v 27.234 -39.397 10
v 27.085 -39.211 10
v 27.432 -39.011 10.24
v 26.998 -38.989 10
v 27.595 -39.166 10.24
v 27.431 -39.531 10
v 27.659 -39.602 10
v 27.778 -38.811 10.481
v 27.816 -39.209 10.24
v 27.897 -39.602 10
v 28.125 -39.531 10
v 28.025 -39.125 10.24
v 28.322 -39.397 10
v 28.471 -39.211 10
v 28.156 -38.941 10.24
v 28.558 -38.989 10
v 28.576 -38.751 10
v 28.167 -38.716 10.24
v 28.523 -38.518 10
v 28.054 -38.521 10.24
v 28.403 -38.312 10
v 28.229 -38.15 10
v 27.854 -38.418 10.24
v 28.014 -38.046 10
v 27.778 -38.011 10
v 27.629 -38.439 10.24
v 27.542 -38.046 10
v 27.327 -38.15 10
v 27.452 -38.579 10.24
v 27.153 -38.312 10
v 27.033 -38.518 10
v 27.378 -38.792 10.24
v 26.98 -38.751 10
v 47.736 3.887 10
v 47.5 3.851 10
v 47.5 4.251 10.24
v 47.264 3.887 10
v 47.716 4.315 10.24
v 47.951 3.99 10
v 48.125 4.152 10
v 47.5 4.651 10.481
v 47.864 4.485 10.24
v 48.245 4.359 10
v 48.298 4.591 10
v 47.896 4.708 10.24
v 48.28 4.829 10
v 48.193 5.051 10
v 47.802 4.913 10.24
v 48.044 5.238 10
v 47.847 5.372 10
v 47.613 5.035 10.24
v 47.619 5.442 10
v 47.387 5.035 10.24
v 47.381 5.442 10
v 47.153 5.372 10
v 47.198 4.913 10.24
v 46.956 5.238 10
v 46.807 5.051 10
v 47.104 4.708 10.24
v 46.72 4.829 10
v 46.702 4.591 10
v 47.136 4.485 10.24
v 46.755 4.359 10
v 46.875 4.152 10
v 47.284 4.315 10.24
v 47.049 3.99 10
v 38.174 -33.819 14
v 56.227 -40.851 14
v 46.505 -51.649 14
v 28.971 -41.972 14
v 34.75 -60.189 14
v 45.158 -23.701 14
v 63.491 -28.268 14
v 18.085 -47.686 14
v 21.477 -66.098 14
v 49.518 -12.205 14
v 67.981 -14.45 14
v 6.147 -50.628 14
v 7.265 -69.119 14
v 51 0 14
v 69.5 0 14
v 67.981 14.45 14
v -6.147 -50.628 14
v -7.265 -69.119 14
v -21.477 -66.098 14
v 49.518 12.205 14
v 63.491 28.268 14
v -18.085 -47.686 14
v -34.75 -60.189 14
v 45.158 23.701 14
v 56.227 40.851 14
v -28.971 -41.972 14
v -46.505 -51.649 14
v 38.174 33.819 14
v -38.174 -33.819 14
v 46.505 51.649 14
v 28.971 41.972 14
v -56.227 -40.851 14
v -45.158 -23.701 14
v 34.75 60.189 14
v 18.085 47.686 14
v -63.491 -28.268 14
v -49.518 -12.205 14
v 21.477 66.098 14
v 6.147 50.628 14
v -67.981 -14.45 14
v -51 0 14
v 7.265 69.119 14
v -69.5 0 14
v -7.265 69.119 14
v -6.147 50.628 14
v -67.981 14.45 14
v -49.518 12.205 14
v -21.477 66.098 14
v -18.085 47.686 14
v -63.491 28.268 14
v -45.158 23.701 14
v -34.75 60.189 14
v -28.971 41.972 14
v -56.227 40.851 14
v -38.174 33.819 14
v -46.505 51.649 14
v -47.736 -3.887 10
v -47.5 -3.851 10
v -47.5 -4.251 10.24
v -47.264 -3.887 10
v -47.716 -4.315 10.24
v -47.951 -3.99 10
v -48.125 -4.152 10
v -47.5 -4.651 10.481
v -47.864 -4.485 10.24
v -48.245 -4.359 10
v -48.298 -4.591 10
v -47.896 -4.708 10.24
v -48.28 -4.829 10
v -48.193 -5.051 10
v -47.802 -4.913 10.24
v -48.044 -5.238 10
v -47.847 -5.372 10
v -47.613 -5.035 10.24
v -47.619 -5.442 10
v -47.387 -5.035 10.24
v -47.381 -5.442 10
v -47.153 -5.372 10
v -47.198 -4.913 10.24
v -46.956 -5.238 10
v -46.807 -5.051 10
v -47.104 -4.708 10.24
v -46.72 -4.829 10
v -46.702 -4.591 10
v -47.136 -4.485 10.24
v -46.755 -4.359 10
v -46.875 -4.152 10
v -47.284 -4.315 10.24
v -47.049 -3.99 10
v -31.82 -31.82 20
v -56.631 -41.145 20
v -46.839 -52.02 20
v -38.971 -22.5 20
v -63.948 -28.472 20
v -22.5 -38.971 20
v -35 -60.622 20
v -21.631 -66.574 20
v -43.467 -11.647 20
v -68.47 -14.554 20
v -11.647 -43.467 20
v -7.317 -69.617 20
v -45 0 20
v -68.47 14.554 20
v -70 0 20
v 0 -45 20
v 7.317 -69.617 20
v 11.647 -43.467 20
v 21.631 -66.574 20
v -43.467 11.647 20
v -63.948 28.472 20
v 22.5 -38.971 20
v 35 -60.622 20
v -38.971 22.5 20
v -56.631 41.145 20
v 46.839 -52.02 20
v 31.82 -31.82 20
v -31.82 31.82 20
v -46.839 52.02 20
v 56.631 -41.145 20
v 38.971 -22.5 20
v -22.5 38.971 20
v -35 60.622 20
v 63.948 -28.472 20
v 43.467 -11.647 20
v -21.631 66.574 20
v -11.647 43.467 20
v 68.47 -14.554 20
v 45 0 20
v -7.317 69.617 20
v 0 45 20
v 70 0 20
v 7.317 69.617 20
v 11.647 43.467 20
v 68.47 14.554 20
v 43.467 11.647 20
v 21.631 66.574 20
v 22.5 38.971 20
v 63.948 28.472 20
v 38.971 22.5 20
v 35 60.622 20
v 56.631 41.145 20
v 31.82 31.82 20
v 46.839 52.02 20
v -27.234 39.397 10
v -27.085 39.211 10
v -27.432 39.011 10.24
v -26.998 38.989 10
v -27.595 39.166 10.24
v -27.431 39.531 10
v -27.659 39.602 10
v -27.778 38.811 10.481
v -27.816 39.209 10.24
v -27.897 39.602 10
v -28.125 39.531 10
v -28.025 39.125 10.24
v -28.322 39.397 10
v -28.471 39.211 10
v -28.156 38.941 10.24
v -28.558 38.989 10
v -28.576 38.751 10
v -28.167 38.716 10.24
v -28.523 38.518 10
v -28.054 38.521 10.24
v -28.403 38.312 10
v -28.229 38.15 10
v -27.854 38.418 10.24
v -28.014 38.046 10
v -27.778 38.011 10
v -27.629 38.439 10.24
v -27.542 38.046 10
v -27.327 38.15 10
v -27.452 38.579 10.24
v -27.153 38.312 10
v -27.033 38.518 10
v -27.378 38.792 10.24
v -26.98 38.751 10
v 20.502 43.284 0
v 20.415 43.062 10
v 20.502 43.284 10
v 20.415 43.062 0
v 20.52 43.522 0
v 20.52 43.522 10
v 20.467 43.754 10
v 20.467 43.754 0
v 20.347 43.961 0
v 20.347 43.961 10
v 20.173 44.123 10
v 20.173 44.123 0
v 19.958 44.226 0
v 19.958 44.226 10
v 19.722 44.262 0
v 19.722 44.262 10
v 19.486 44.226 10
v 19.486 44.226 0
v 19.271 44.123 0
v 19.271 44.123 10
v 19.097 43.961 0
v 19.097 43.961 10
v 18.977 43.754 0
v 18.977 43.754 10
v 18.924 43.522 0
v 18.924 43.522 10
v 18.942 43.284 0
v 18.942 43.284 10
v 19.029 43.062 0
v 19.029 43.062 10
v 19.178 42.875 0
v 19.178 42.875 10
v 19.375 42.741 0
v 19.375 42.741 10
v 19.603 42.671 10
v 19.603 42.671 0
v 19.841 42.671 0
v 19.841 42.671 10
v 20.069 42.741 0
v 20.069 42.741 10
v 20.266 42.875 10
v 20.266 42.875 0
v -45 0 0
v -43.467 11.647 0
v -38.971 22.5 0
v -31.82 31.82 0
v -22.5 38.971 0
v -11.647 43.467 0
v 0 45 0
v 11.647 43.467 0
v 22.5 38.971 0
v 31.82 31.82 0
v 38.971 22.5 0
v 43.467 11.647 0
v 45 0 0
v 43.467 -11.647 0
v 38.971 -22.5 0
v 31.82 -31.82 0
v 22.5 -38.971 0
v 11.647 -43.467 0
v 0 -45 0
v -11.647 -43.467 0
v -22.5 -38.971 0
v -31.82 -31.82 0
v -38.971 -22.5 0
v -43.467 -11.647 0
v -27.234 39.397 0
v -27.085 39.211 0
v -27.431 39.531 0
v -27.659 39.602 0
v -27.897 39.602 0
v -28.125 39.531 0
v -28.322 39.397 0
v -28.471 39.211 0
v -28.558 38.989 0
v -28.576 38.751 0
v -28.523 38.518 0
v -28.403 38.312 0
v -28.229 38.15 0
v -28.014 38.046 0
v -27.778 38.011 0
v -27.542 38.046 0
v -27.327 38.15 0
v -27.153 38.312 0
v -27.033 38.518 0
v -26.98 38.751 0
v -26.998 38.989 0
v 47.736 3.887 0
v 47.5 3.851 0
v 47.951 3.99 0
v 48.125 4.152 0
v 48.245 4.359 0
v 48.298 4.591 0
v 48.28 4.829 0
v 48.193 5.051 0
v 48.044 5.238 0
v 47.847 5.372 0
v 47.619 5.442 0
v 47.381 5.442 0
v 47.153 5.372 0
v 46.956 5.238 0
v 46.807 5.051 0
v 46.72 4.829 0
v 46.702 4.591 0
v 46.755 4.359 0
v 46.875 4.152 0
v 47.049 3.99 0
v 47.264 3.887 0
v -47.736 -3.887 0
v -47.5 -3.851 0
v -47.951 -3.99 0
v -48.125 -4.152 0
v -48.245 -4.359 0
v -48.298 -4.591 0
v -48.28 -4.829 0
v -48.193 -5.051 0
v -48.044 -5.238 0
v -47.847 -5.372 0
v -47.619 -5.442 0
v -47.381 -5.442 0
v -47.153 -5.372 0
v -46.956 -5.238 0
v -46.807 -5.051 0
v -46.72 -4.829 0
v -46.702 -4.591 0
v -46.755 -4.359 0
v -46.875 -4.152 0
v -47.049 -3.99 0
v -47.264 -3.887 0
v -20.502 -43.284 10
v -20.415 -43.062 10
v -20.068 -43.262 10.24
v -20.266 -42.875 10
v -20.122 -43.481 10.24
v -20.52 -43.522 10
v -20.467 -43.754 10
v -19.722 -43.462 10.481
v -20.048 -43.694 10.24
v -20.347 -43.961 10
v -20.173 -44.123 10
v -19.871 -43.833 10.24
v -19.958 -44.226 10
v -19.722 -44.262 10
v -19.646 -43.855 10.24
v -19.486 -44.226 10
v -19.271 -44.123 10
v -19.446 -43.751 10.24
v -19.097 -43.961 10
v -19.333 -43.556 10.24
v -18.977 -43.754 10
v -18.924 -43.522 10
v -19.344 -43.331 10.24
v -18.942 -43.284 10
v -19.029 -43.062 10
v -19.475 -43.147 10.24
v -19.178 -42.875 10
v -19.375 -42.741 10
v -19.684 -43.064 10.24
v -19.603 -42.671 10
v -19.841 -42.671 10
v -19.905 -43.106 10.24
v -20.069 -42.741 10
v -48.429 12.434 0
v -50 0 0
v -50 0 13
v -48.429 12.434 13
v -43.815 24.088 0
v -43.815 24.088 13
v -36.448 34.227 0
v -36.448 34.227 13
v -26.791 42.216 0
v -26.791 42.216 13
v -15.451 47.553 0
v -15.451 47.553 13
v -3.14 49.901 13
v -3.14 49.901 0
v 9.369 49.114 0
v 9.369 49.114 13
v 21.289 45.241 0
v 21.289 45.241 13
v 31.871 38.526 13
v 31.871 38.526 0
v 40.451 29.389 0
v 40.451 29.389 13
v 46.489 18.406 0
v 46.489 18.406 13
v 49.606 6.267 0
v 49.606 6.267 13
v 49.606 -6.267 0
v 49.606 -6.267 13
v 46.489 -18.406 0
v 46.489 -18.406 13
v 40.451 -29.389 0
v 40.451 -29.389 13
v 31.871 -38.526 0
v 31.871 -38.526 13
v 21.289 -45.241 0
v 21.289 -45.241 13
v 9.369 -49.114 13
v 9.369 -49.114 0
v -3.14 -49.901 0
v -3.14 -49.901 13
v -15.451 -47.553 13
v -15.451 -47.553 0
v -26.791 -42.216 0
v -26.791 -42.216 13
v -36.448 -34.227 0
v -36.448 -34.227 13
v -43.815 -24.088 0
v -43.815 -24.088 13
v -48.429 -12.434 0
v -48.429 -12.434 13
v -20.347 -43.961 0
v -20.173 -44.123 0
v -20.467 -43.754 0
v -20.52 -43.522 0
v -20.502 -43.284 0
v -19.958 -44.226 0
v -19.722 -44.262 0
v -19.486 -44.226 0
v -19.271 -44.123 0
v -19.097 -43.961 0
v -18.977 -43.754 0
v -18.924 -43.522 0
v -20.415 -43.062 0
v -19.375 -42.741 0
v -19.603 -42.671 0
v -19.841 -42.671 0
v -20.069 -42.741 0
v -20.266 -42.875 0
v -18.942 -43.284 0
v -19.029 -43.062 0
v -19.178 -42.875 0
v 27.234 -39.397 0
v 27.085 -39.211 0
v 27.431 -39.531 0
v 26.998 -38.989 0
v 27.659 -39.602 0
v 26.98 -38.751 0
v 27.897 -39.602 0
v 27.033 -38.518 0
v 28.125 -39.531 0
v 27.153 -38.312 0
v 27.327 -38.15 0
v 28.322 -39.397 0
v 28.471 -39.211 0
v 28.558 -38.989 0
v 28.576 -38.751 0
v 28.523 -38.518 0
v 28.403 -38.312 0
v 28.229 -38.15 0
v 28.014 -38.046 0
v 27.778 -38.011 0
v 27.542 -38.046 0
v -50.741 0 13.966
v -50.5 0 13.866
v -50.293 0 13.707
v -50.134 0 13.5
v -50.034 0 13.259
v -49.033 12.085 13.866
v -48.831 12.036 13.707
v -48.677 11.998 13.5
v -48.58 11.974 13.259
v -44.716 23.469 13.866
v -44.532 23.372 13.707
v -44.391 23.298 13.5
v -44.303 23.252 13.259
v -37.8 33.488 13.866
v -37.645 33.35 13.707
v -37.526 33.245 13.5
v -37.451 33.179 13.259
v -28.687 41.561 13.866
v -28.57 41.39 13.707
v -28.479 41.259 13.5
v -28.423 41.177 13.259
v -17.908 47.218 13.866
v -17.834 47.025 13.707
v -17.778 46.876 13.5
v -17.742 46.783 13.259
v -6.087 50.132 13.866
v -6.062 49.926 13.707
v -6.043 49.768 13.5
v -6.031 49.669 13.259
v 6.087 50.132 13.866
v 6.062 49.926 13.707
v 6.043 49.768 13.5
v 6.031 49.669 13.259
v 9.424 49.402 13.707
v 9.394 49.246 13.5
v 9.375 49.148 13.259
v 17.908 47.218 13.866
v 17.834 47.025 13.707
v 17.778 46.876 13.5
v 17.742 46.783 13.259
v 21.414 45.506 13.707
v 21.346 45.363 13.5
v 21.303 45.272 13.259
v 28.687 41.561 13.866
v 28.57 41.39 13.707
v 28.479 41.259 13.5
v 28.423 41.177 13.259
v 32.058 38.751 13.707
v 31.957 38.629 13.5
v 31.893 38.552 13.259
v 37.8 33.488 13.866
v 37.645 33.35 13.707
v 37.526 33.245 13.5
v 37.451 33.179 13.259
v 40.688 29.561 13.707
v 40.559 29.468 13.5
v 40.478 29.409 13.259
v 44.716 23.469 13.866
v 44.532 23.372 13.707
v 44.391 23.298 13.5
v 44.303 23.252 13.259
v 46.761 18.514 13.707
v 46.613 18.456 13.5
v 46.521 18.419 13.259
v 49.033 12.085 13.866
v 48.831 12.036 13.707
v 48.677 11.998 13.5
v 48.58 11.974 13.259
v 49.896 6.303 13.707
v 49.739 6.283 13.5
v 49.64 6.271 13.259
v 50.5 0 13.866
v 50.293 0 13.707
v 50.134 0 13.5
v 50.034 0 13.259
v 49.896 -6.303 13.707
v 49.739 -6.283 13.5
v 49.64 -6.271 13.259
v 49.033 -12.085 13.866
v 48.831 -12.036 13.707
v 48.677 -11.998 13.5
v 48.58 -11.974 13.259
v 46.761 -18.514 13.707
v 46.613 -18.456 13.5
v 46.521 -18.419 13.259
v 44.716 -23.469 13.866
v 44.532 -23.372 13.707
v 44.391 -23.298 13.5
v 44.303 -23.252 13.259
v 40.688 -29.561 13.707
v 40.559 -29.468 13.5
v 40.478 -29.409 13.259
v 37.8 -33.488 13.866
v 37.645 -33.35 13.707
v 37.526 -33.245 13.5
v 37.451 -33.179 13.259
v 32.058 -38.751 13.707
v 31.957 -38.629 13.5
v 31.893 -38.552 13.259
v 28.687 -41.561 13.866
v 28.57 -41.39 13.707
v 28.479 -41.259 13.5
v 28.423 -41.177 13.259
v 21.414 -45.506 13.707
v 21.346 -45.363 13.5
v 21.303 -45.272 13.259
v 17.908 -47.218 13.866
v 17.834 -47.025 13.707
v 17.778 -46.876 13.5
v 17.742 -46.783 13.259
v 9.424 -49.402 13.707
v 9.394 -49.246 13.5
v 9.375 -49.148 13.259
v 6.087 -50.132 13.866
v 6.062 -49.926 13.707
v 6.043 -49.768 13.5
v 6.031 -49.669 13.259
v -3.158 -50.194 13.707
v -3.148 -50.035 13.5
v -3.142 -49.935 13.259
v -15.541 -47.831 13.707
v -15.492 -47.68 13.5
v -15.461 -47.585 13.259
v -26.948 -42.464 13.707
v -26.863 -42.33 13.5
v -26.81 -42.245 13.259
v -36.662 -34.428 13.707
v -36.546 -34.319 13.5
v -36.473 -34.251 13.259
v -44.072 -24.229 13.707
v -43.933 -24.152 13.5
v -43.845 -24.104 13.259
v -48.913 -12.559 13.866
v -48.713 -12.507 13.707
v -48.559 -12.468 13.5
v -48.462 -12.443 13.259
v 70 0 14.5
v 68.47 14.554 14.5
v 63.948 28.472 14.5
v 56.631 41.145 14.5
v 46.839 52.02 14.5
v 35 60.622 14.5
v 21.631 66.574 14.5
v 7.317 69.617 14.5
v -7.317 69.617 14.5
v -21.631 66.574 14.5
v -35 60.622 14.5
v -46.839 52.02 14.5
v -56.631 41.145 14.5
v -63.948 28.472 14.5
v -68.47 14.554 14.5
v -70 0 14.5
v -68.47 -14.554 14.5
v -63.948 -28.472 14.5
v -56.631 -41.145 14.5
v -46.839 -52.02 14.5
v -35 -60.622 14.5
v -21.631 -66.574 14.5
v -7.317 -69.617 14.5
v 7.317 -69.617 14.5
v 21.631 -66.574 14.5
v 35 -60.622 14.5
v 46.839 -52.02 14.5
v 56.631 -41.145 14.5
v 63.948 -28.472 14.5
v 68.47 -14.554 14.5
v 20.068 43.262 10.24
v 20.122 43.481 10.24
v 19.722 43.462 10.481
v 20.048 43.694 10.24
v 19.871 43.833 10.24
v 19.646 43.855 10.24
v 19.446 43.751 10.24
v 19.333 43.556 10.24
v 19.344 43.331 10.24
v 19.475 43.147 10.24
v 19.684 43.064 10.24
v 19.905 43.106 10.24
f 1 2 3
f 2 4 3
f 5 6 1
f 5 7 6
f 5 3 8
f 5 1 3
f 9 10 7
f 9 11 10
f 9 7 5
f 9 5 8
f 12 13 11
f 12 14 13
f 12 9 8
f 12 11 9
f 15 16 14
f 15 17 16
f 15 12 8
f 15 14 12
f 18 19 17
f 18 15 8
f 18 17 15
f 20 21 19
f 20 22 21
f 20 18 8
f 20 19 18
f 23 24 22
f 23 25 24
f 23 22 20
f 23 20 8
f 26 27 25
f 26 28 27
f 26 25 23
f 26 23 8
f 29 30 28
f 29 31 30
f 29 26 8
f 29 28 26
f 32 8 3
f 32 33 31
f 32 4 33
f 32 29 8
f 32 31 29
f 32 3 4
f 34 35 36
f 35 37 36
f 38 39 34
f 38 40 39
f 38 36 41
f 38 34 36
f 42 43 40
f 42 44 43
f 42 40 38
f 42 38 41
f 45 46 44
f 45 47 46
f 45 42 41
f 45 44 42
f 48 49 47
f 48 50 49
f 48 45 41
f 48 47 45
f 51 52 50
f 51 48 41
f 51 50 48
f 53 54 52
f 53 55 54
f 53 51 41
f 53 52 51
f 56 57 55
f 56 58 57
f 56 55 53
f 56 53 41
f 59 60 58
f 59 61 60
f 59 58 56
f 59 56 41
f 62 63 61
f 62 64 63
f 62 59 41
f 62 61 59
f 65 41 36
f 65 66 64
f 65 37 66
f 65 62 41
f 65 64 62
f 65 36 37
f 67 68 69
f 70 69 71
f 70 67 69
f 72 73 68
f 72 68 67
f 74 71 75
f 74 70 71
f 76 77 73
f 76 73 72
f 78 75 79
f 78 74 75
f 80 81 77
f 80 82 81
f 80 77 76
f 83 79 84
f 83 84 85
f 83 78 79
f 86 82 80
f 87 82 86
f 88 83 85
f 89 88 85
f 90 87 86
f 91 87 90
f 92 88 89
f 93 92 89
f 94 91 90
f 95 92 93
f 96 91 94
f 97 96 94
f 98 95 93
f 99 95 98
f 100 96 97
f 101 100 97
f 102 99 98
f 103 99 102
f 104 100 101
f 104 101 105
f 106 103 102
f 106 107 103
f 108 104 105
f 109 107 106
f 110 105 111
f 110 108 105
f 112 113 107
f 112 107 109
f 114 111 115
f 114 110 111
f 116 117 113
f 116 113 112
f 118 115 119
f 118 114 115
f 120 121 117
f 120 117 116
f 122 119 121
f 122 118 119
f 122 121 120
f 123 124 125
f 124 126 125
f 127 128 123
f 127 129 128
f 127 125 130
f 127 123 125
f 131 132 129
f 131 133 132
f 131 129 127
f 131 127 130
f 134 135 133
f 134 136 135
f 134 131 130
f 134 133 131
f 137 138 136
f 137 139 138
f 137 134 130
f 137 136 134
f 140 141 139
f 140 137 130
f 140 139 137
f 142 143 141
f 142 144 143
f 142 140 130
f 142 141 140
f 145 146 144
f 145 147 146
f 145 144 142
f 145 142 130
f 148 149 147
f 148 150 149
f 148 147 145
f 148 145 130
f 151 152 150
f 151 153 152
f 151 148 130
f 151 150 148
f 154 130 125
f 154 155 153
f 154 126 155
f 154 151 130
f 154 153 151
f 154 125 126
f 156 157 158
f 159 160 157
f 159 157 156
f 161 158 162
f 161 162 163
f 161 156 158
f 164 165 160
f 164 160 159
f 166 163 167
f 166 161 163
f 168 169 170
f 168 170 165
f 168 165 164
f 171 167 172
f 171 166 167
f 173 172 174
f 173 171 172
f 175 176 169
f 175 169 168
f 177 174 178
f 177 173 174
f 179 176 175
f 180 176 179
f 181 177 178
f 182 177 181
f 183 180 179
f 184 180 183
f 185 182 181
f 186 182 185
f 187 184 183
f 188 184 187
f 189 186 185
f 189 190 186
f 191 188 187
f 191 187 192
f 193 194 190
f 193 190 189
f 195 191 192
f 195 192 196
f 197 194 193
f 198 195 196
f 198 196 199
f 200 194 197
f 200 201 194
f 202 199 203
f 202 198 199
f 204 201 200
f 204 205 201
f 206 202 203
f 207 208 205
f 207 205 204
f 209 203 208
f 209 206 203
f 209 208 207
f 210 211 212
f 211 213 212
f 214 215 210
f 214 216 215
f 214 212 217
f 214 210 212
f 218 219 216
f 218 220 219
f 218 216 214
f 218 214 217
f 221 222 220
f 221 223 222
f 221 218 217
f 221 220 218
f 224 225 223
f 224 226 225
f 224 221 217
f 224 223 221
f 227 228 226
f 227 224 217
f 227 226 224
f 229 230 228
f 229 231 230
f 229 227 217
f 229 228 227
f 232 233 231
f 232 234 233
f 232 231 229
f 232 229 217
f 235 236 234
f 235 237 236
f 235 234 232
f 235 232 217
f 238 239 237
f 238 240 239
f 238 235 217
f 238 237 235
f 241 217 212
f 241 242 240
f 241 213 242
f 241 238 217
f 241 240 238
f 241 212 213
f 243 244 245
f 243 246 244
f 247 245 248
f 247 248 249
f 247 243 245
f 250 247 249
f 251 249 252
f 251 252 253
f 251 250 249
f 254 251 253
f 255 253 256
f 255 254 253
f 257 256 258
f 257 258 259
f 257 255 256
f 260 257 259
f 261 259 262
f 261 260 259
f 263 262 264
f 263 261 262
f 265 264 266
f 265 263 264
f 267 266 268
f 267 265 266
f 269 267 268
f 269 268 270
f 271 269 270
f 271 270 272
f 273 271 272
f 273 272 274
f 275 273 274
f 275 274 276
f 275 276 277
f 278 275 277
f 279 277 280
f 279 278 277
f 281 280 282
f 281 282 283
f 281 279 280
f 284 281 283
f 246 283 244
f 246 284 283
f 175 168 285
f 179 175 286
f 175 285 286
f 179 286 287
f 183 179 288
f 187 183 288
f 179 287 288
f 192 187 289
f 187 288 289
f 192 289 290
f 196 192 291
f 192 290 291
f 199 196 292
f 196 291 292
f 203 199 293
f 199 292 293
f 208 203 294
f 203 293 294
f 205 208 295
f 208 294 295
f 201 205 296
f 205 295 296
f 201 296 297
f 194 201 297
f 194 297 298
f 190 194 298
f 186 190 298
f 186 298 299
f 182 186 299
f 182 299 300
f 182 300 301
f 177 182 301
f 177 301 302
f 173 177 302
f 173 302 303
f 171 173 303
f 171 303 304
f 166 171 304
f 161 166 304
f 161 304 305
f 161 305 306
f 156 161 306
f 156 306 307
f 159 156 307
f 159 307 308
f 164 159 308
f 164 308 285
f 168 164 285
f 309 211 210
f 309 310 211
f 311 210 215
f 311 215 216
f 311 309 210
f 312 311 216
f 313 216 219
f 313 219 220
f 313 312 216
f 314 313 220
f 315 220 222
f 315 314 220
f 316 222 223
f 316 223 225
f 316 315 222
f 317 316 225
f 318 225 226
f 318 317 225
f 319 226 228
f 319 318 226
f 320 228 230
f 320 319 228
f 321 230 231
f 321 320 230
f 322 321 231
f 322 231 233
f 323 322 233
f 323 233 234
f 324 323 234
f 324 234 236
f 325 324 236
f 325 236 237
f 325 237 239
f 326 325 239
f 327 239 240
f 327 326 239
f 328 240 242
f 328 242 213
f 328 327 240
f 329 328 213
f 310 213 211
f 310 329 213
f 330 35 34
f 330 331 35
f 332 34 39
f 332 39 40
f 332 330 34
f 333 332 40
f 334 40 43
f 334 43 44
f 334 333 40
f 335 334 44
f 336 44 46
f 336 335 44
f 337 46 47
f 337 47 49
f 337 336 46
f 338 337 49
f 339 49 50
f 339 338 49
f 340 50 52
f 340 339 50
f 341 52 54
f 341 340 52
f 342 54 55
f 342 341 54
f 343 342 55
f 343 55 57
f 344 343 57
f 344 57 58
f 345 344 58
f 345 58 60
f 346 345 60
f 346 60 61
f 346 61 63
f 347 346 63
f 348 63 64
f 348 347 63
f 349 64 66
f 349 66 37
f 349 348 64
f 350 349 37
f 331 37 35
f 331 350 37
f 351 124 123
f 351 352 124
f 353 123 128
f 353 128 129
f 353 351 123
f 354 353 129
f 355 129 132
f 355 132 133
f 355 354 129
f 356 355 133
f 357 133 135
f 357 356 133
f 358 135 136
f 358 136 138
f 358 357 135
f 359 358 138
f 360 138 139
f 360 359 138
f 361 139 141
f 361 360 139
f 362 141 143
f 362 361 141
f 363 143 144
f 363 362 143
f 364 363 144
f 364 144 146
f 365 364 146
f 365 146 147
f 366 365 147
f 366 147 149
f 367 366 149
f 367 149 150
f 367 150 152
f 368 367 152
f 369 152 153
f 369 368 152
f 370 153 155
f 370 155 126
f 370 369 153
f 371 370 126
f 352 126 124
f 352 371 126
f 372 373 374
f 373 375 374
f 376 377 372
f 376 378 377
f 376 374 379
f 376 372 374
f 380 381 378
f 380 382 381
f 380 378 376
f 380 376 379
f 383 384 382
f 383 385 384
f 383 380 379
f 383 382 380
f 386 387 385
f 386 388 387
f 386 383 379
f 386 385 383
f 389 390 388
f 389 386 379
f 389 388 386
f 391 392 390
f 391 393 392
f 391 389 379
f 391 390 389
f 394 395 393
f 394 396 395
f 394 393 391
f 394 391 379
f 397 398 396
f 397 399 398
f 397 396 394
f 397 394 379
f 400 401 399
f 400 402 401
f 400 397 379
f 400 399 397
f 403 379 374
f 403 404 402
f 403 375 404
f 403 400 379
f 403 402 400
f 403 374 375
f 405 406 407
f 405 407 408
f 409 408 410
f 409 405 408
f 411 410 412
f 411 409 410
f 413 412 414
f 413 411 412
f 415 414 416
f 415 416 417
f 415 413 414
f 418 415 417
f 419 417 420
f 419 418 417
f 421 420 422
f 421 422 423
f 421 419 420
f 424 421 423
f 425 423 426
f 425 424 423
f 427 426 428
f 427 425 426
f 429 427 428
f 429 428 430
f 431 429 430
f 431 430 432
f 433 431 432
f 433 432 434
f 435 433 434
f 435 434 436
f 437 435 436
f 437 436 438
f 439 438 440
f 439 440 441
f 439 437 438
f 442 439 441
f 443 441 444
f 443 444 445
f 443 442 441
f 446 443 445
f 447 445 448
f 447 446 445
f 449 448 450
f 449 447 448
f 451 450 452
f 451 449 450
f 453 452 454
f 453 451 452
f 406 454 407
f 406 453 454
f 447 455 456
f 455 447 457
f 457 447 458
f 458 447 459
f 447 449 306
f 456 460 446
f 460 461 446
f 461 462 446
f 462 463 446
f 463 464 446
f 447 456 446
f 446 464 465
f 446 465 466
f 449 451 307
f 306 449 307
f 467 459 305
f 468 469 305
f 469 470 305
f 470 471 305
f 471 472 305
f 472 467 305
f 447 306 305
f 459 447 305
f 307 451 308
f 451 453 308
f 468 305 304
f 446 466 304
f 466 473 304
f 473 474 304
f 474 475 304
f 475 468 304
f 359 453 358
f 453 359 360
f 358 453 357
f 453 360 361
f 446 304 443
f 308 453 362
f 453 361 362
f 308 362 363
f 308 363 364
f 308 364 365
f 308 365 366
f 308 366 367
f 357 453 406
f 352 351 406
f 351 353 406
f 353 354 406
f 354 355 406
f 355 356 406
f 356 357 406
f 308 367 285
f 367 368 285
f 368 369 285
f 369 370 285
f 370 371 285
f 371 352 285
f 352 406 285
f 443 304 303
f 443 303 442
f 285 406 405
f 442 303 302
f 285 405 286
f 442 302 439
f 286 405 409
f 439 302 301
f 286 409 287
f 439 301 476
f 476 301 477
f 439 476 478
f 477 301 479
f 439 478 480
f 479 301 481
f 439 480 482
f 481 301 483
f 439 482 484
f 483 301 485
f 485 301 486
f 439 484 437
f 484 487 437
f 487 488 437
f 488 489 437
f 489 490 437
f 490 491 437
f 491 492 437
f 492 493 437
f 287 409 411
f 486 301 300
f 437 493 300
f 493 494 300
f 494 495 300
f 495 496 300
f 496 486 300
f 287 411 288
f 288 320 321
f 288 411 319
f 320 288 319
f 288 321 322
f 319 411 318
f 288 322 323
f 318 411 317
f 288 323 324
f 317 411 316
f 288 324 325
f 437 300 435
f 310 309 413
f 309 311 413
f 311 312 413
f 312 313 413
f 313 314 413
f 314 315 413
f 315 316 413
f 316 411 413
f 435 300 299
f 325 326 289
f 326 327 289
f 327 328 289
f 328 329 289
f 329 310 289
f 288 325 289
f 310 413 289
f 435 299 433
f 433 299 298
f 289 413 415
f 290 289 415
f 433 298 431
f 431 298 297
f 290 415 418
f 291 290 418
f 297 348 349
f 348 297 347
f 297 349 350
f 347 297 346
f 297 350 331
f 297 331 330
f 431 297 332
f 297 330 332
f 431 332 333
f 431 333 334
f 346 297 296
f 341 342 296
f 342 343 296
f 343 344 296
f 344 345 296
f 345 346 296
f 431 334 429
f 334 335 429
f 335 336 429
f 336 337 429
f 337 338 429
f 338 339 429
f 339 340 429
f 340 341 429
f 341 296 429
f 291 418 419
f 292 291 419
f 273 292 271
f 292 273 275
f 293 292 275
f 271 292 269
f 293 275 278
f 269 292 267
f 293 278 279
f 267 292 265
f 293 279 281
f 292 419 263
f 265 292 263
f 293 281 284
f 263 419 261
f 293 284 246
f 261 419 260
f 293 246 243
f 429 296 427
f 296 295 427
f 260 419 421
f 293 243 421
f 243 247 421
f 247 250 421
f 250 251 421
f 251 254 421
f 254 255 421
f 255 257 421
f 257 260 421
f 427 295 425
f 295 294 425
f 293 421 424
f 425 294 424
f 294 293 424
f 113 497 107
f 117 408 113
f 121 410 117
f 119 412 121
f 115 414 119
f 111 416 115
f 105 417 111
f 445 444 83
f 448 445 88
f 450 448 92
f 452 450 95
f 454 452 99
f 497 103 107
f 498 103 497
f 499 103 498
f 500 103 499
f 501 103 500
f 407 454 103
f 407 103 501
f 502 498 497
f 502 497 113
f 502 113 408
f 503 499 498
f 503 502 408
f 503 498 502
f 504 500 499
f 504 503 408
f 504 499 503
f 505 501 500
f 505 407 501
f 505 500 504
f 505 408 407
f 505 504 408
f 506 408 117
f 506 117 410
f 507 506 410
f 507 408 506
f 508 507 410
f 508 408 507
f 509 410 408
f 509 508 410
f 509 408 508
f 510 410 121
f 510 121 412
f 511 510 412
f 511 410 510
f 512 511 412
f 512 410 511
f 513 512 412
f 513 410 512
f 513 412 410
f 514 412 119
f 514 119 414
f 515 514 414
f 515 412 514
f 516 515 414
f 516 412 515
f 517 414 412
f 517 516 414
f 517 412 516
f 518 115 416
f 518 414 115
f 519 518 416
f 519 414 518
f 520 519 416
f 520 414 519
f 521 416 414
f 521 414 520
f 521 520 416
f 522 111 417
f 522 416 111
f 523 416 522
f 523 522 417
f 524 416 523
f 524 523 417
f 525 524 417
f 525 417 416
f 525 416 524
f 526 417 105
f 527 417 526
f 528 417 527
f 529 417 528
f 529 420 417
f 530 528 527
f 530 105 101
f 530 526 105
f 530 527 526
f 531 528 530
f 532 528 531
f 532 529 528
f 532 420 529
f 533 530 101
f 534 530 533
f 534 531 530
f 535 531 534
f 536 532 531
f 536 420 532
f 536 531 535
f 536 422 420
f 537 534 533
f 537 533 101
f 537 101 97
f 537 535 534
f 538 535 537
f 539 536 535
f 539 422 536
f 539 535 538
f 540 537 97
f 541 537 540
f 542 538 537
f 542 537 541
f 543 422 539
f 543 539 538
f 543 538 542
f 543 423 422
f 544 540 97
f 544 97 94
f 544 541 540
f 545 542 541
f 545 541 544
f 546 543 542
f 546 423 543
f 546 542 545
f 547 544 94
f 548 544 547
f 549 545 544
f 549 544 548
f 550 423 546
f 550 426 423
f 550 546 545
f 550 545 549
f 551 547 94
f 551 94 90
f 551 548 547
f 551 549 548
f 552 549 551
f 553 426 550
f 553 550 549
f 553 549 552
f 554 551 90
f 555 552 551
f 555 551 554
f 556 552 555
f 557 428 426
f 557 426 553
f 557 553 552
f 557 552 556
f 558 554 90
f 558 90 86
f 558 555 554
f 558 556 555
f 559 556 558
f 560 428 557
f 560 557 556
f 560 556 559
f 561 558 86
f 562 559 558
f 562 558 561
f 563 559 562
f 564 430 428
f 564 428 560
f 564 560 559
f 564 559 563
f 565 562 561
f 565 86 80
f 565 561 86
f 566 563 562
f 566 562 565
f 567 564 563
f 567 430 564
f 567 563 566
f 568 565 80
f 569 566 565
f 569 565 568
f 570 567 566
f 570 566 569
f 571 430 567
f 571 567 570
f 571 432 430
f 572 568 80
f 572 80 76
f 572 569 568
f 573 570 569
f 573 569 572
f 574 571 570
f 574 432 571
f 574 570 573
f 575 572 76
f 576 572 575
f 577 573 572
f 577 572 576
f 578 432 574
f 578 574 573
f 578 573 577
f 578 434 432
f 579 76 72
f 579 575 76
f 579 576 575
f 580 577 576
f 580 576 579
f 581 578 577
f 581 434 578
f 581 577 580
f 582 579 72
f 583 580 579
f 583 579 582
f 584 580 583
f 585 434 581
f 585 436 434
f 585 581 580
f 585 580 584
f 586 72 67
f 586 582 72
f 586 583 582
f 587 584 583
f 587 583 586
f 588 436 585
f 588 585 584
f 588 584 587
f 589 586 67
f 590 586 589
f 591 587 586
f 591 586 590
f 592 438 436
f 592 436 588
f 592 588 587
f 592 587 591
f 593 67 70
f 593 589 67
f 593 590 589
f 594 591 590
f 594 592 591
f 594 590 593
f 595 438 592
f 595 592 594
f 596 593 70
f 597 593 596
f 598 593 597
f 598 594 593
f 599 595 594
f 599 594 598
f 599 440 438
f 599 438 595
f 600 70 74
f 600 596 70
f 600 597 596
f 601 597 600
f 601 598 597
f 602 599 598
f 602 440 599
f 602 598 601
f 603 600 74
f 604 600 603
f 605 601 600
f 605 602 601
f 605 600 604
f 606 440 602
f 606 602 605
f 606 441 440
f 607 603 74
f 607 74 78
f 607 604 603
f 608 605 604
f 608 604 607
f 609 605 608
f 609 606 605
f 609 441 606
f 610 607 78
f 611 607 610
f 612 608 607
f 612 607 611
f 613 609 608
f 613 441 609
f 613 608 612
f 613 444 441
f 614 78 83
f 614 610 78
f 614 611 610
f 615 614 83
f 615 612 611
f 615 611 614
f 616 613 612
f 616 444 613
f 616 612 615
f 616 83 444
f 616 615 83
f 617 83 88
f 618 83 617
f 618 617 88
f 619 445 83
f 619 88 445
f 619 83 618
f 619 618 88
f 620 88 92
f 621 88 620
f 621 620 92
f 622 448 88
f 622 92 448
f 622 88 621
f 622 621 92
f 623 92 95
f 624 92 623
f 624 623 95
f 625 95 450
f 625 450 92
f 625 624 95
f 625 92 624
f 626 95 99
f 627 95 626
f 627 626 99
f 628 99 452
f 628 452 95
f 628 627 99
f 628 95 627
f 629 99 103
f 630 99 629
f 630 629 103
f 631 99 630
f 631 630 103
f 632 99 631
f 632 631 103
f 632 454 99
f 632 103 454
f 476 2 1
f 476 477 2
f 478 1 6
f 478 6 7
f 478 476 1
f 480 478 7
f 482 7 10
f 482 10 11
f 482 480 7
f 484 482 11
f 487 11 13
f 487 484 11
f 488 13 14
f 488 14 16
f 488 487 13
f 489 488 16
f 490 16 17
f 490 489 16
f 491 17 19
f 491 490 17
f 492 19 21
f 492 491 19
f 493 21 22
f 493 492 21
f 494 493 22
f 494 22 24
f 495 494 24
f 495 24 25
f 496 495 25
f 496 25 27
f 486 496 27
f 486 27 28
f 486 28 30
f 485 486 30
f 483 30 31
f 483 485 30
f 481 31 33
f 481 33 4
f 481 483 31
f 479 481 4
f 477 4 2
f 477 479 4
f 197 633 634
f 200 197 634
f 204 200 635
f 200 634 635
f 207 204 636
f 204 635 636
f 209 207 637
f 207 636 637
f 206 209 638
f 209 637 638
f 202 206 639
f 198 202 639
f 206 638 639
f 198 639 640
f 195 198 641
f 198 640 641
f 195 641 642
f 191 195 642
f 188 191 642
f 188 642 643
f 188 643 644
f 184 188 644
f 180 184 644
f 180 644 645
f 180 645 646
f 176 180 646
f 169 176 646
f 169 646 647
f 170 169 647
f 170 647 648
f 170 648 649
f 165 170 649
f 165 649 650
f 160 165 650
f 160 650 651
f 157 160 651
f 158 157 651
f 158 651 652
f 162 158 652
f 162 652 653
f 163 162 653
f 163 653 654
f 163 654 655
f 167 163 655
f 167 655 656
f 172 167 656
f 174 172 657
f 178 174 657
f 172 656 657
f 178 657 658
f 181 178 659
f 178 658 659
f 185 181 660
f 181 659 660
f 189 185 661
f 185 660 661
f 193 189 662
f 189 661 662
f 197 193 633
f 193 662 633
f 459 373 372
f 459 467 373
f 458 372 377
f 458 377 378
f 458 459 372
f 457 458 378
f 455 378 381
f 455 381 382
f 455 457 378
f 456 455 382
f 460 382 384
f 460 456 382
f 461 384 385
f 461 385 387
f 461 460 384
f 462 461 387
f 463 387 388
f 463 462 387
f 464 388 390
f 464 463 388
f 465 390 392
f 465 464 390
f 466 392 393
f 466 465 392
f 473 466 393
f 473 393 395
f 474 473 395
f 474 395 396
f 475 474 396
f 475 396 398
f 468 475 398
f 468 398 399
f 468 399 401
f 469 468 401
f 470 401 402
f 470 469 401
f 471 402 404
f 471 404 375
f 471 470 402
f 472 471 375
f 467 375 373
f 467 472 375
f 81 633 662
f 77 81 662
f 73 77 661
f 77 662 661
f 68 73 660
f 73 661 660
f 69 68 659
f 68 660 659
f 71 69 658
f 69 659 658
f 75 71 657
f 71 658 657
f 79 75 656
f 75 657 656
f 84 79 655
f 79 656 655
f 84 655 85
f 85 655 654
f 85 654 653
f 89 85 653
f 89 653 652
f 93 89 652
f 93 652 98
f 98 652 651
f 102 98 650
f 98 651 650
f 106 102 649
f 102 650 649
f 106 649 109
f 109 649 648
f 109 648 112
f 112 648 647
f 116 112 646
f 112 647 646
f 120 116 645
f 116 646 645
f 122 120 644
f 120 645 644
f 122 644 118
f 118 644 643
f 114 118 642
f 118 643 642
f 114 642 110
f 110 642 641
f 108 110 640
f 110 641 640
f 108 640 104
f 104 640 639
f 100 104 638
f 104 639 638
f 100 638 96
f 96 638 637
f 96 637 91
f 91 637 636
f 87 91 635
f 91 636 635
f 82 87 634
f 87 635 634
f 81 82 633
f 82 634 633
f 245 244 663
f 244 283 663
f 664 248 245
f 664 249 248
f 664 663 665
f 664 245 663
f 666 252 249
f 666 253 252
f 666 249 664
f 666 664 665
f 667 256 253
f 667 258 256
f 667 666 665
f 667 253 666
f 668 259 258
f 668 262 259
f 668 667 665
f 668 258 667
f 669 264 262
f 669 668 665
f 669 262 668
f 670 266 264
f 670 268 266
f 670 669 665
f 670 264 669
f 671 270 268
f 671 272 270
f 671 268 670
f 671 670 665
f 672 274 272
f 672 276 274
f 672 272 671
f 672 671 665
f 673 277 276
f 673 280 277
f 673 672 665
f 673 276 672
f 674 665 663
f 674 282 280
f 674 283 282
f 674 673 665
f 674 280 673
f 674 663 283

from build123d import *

# Parameters (mm, degrees)
SKIZZE1_R                       = 70
AUFSATZ_LINEAR_AUSTRAGEN1_DEPTH = 20
SKIZZE2_OUTSIDE_W               = 181.8
SKIZZE2_OUTSIDE_H               = 181.8
SKIZZE2_OUTSIDE_R               = 50
SCHNITT_LINEAR_AUSTRAGEN3_DEPTH = 14
SKIZZE3_R                       = 45
SCHNITT_LINEAR_AUSTRAGEN4_DEPTH = 21
VERRUNDUNG1_R                   = 1
FASE1_SIZE                      = 0.5
KREISMUSTER1_COUNT              = 6


with BuildPart() as part:
    # Skizze1 → Aufsatz-Linear austragen1 (new body)
    with BuildSketch(Plane.XY):
        Circle(SKIZZE1_R)
    extrude(amount=AUFSATZ_LINEAR_AUSTRAGEN1_DEPTH)

    # Skizze2 outside → Schnitt-Linear austragen3 (cut)
    with BuildSketch(Plane(origin=(0, 0, 0), x_dir=(-1, 0, 0), z_dir=(0, 0, -1))):
        Rectangle(SKIZZE2_OUTSIDE_W, SKIZZE2_OUTSIDE_H)
        Circle(SKIZZE2_OUTSIDE_R, mode=Mode.SUBTRACT)
    extrude(amount=-SCHNITT_LINEAR_AUSTRAGEN3_DEPTH, mode=Mode.SUBTRACT)

    # Skizze3 → Schnitt-Linear austragen4 (cut, through all)
    with BuildSketch(Plane(origin=(0, 0, 0), x_dir=(-1, 0, 0), z_dir=(0, 0, -1))):
        Circle(SKIZZE3_R)
    extrude(amount=-SCHNITT_LINEAR_AUSTRAGEN4_DEPTH, mode=Mode.SUBTRACT)

    # Verrundung1
    verrundung1_edges = [part.edges().sort_by_distance(p)[0] for p in [
        (50, 0, 14),
    ]]
    fillet(verrundung1_edges, radius=VERRUNDUNG1_R)

    # Fase1
    fase1_edges = [part.edges().sort_by_distance(p)[0] for p in [
        (-70, 0, 14),
    ]]
    chamfer(fase1_edges, length=FASE1_SIZE)

    # Skizze8 → M2 Gewindebohrung1 (revolve, cut)
    with BuildSketch(Plane(origin=(-47.5, -4.651151255, 0), x_dir=(0, 1, 0), z_dir=(1, 0, 0))):
        Polygon((0, 0), (0, 10.480688495), (0.8, 10), (0.8, 0), align=None)
    m2_gewindebohrung1 = revolve(axis=Axis((-47.5, -4.651151255, -6.35), (0, 0, 1)), mode=Mode.SUBTRACT)

    # Kreismuster1: M2 Gewindebohrung1 ×6 about axis
    kreismuster1_axis = Axis((0, 0, 0), (0, 0, 1))
    for i in range(1, KREISMUSTER1_COUNT):
        add(m2_gewindebohrung1.rotate(kreismuster1_axis, i * 360 / KREISMUSTER1_COUNT), mode=Mode.SUBTRACT)


solid = part.part
